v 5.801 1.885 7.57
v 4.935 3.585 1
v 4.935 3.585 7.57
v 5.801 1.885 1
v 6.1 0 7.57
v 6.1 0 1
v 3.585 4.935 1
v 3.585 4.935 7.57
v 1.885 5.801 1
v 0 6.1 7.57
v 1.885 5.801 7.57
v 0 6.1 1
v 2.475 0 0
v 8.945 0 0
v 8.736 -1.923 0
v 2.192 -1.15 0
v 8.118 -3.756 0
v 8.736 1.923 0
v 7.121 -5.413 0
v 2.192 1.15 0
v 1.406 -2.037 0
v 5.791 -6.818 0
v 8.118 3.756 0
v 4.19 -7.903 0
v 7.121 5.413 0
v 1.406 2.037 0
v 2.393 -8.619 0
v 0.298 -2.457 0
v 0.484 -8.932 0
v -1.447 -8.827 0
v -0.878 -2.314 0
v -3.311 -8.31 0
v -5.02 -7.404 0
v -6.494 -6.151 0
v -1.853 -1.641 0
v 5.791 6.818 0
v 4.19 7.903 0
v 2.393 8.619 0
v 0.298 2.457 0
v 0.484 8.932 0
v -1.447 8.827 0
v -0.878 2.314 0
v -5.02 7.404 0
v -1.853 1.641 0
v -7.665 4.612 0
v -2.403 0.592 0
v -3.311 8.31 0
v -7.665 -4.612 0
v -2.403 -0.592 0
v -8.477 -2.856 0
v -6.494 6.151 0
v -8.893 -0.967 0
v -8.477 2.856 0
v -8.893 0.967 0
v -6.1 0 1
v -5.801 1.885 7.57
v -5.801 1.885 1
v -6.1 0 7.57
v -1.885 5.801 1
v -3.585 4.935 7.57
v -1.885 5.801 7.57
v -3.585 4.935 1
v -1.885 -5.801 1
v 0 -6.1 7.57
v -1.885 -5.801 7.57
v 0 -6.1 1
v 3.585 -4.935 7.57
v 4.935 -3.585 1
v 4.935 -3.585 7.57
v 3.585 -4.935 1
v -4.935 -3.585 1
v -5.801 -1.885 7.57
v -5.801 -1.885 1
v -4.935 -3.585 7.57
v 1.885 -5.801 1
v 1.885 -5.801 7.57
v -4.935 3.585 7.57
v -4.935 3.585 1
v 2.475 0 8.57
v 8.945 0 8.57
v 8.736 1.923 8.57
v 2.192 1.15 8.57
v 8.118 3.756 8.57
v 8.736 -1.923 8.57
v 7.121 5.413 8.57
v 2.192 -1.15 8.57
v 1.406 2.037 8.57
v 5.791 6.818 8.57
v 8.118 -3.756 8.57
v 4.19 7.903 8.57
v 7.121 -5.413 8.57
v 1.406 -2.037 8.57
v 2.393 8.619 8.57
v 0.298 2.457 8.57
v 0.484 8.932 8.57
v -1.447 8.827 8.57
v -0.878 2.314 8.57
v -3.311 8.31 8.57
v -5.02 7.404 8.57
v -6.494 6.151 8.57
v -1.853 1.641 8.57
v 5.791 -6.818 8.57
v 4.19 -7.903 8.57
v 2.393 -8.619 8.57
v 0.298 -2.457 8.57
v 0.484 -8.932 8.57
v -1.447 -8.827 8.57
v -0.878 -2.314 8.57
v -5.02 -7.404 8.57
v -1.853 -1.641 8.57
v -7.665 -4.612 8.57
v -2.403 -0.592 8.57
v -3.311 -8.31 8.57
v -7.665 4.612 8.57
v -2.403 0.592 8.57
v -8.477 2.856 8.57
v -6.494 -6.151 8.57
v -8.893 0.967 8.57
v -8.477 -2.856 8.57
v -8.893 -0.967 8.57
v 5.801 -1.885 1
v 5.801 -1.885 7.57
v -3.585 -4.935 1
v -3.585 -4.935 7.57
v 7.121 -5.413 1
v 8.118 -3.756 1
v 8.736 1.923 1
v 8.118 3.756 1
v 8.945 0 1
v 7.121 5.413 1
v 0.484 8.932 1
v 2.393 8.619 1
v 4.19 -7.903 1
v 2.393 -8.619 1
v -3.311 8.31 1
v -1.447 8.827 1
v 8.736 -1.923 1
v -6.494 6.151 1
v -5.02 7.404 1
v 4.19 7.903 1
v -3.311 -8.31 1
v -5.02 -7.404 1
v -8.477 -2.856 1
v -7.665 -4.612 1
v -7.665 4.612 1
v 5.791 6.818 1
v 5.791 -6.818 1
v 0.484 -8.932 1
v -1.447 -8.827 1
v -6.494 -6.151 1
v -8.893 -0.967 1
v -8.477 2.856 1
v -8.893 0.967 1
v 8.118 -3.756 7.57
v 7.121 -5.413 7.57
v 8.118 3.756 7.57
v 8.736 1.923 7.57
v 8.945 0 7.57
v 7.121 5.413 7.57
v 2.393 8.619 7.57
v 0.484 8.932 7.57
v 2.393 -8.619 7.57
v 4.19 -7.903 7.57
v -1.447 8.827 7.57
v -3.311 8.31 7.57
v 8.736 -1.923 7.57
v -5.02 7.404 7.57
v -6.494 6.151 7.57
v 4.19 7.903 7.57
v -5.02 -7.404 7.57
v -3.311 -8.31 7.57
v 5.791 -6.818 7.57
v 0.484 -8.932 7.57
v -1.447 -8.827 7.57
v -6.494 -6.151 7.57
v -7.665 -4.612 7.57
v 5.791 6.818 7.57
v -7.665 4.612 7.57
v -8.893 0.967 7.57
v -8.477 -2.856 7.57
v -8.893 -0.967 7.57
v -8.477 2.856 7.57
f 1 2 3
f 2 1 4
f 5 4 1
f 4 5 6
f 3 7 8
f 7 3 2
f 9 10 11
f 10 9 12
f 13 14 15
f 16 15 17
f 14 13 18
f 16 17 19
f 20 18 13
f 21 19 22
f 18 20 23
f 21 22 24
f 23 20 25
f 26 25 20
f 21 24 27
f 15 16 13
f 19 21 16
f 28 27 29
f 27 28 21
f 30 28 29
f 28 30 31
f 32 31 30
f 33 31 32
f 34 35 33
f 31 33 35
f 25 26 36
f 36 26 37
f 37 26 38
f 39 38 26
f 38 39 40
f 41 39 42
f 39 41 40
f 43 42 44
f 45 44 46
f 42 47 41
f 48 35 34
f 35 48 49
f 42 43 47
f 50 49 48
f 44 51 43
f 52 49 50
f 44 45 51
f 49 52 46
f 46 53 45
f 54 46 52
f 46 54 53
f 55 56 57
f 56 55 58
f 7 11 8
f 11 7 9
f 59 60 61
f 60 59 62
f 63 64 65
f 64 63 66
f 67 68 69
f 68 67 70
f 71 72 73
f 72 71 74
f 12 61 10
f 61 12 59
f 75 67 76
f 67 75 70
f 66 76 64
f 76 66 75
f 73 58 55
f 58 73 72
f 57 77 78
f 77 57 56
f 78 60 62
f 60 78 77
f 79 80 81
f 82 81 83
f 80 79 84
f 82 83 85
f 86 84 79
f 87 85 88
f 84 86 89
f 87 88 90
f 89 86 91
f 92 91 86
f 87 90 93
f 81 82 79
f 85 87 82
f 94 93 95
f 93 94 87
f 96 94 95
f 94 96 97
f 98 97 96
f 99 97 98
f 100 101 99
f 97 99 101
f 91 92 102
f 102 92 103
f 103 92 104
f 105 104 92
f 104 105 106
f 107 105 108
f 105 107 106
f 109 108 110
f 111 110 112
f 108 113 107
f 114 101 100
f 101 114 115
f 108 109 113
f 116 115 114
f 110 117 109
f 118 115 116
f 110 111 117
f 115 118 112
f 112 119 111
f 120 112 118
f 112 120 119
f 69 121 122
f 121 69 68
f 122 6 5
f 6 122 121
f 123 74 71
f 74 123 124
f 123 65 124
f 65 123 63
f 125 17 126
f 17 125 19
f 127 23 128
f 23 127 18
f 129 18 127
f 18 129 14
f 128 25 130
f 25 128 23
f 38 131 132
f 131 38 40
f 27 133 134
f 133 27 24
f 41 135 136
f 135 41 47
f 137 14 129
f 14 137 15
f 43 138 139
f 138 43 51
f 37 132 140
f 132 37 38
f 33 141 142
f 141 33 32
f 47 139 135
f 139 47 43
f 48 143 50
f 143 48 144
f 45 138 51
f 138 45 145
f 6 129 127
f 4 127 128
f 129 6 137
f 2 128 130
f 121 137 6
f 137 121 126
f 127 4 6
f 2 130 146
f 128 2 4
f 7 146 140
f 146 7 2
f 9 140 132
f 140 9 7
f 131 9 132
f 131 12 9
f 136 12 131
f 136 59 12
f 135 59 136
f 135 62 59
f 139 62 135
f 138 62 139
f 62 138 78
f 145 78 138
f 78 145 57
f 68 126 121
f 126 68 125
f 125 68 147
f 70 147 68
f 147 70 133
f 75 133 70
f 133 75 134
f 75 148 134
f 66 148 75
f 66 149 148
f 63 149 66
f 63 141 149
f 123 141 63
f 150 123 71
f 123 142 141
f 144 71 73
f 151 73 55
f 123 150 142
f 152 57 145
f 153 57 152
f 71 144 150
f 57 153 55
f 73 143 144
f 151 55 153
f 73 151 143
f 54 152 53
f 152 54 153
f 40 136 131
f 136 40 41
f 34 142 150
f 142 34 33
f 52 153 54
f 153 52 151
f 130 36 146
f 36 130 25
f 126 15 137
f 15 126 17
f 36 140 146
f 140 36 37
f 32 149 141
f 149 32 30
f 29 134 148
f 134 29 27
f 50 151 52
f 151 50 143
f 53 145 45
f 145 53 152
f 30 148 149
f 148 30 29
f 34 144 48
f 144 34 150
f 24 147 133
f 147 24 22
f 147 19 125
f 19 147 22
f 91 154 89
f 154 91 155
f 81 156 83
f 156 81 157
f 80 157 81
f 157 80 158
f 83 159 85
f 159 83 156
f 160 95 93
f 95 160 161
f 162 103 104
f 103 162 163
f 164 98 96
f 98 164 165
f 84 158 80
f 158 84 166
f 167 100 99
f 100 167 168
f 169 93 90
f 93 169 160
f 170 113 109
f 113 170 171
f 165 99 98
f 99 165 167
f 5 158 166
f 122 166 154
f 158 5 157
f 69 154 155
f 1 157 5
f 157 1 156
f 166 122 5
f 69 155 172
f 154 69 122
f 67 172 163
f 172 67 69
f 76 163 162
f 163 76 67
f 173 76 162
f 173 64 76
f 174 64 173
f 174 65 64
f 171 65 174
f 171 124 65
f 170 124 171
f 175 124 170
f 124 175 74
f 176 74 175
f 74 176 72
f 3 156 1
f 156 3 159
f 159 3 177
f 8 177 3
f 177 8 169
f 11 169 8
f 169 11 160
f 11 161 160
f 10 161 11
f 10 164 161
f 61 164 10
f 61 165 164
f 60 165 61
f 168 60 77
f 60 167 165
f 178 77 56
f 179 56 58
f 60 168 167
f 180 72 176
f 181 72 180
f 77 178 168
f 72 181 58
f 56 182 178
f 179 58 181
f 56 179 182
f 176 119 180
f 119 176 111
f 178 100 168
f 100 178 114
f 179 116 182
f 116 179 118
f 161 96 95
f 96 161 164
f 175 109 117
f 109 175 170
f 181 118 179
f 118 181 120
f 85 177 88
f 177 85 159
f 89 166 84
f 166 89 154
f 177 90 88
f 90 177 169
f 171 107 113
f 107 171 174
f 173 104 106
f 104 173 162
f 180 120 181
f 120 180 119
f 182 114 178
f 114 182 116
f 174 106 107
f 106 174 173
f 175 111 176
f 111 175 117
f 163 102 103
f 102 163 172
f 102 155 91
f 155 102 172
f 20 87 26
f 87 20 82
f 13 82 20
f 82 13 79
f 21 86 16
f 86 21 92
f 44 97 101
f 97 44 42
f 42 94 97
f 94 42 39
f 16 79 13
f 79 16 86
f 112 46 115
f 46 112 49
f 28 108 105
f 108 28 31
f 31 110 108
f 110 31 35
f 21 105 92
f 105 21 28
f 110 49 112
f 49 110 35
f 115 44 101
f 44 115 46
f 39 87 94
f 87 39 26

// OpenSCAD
// file: BeltUp/Belt.scad
/*
  Render a straight piece of belt from A -> B. Use `flip` to change which side the teeth are on.
  - Specification of the belt to draw
  - Array of [start_pos, end_pos, flip_tooth_side]
*/
module beltup_render_straight_belt(belt_spec, position) {
    a = position[0];
    b = position[1];
    flip = position[2];

    echo(position);

    ab = b - a;
    length = magnitude(ab);
    norm = ab / length;
    xpd = cross([0, 1, 0], extend2d_to_3d(norm, 0));
    dot = dot2d([0, 1], norm);
    zangle = acos(dot) * sign(xpd[2]) + (flip ? 180 : 0);

    ty = beltup_spec_belt_tooth_length(belt_spec);
    tz = beltup_spec_belt_tooth_height(belt_spec);
    sy = beltup_spec_belt_tooth_separation(belt_spec);
    num_teeth = beltup_num_teeth(belt_spec, length);

    x = beltup_spec_belt_width(belt_spec);
    y = length;
    z = beltup_spec_belt_thickness(belt_spec);

    translate(flip ? b : a) rotate([0, -90, zangle]) color(beltup_spec_belt_color(belt_spec))
        intersection() {

            //Intersect with this volume to only show valid teeth
            cube([x, y, z + tz + 1]);

            union() {
                //Base of belt
                cube([x, y, z]);

                //Teeth
                for(offset = [0 : num_teeth])
                    translate([0, offset * (sy + ty), z])
                        cube([x, ty, tz]);
            }
        }
}
// file: BeltUp/Wheel.scad
use <Specs.scad>;

/* Render a wheel according to the given specifications */
module beltup_render_wheel(wheel_instance) {

    mwm_assert(wheel_instance[0] != "wheel_instance", "Wrong type", "beltup_render_wheel", concat("Expected a `wheel_instance`, got a `", wheel_instance[0], "`"))
    {
        wheel_spec = beltup_spec_wheel_instance_spec(wheel_instance);
        belt_spec = beltup_spec_wheel_instance_belt(wheel_instance);

        mwm_assert(belt_spec[0] != "belt", "Wrong type", "beltup_render_wheel", concat("Expected a `belt`, got a `", belt_spec[0], "`"))
        {
            ztop = beltup_spec_wheel_outer_z_top(wheel_spec);
            zbot = beltup_spec_wheel_outer_z_bot(wheel_spec);

            position = beltup_spec_wheel_instance_pos(wheel_instance);

            bw = beltup_spec_belt_width(belt_spec);
            bt = beltup_spec_belt_thickness(belt_spec);

            ty = beltup_spec_belt_tooth_height(belt_spec);

            wir = beltup_spec_wheel_inner_rad(wheel_spec);
            wor = beltup_spec_wheel_outer_rad(wheel_spec);

            arg_out_of_range(wir < (bt + ty), "beltup_cmd_wheel_wheel", "belt_radius", "Must be &gt;= belt_thickness + tooth_height")
            {
                translate(position) difference() {
                    union()
                    {
                        //Center cylinder
                        translate([0, 0, 0]) cylinder(r = wir, h = bw, $fn = 100);

                        //bot belt guide
                        translate([0, 0, -zbot]) cylinder(r = wir + wor, h = zbot, $fn = 23);

                        //top belt guide
                        translate([0, 0, bw]) cylinder(r = wir + wor, h = ztop, $fn = 23);
                    }

                    translate([0, 0, -bw])
                        cylinder(r = beltup_spec_wheel_hole_radius(wheel_spec), h = bw * 3, $fs = 0.1);
                }
            }
        }
    }
}

/* Calculate the tangent point between a point and a wheel */
function beltup_wheel_tangent(point, wheel_instance, side) = let(

    wheel_spec = beltup_spec_wheel_instance_spec(wheel_instance),
    belt_spec = beltup_spec_wheel_instance_belt(wheel_instance),
    wheel_pos = beltup_spec_wheel_instance_pos(wheel_instance),
    teeth_in = beltup_spec_wheel_instance_teethin(wheel_instance),

    //Depending on which way the belt is oriented we may need to add one extra belt thickness to clear the wheel rim
    extra_radius = teeth_in ? beltup_spec_belt_thickness(belt_spec) : 0,

    //Generate both tangents from current point to next belt.
    tangents = circle_tangents_through_point(point, circ(wheel_pos, beltup_spec_wheel_inner_rad(wheel_spec) + extra_radius)),

    //Choose which side to go to
    tangent = side ? tangents[0] : tangents[1],

    //Determine if we need to flip the belt
    is_left = is_point_left_of_ray(tangent, wheel_pos),
    flip = (!is_left && teeth_in) || (is_left && !teeth_in),

    end_pos = point_along_ray(tangent, 1)
) [
    point,
    end_pos,
    flip,
];

/* Calculate the tangents between 2 circles, return one based on the wheel_side parameters */
function beltup_wheel_wheel_tangent(belt_spec, wheel_instance_1, wheel_side_1, wheel_instance_2, wheel_side_2) = let(

    flip = true,

    c1 = beltup_spec_wheel_instance_as_circle(wheel_instance_1),
    c2 = beltup_spec_wheel_instance_as_circle(wheel_instance_2),
    tangents = circle_circle_tangents(c1, c2, preserve_order = true),

    tangent_index = !wheel_side_1 && !wheel_side_2 ? 0
                  : !wheel_side_1 && wheel_side_2  ? 1
                  : wheel_side_1 && !wheel_side_2  ? 2
                  :                                  3,

    tangent = tangents[tangent_index],
    start = point_along_ray(tangent, 0),
    end = point_along_ray(tangent, 1)

    //true,false = 2

) [
    start,
    end,
    flip
];
// file: BeltUp/Specs.scad
/* Specify a new belt, this belt spec can be passed into other functions
   - width              - How wide is the belt
   - thickness          - How thick is the belt
   - tooth_length       - How far along the belt does a single tooth extend
   - tooth_separation   - How far between teeth
   - tooth_height       - How far from the belt does each tooth extend
*/
function beltup_specify_belt(width, thickness, tooth_length, tooth_separation, tooth_height, color) = [
    "belt",
    width,
    thickness,
    tooth_length,
    tooth_separation,
    tooth_height,
    color
];
function beltup_spec_belt_width(belt_spec) = belt_spec[1];
function beltup_spec_belt_thickness(belt_spec) = belt_spec[2];
function beltup_spec_belt_tooth_length(belt_spec) = belt_spec[3];
function beltup_spec_belt_tooth_separation(belt_spec) = belt_spec[4];
function beltup_spec_belt_tooth_height(belt_spec) = belt_spec[5];
function beltup_spec_belt_color(belt_spec) = belt_spec[6];
function beltup_num_teeth(belt_spec, length) = ceil(length / (beltup_spec_belt_tooth_length(belt_spec) + beltup_spec_belt_tooth_separation(belt_spec)));

/* Specify a new wheel, this wheel can be passed into other functions
   - inner_radius           - What is the radius of the part of the wheel the belt wraps around
   - outer_radius           - What is the radius of the guides either side of the belt
   - outer_height_top       - What is the height of the guide above the belt
   - outer_height_bot       - What is the height of the guide below the belt
*/
function beltup_specify_wheel(inner_radius, outer_radius = 2, outer_height_top = 1, outer_height_bot = 1, hole_radius = 0) = [
    "wheel",
    inner_radius,
    outer_radius,
    outer_height_top,
    outer_height_bot,
    hole_radius
];
function beltup_spec_wheel_inner_rad(wheel_spec) = wheel_spec[1];
function beltup_spec_wheel_outer_rad(wheel_spec) = wheel_spec[2];
function beltup_spec_wheel_outer_z_top(wheel_spec) = wheel_spec[3];
function beltup_spec_wheel_outer_z_bot(wheel_spec) = wheel_spec[4];
function beltup_spec_wheel_hole_radius(wheel_spec) = wheel_spec[5];

/* Specify a new instance of a wheel spec
*/
function beltup_create_wheel(belt_spec, wheel_spec, position, teeth_in) = [
  "wheel_instance",
  wheel_spec,
  belt_spec,
  position,
  teeth_in
];
function beltup_spec_wheel_instance_spec(wheel_instance) = wheel_instance[1];
function beltup_spec_wheel_instance_belt(wheel_instance) = wheel_instance[2];
function beltup_spec_wheel_instance_pos(wheel_instance) = wheel_instance[3];
function beltup_spec_wheel_instance_teethin(wheel_instance) = wheel_instance[4];
function beltup_spec_wheel_instance_as_circle(wheel_instance) = circ(
  wheel_instance[3],
  beltup_spec_wheel_inner_rad(wheel_instance[1]) + (wheel_instance[4] ? beltup_spec_belt_thickness(wheel_instance[2]) : 0)
);

function beltup_type(object) = object[0];
// file: geometry-2D.scad
function vector_2d(x, y) = [ x, y ];
function x(v) = v[0];
function y(v) = v[1];
function extend2d_to_3d(xy, z) = [ xy[0], xy[1], z];

function perpendicular_left(v) = [ -y(v), x(v) ];
function perpendicular_right(v) = [ y(v), -x(v) ];

function magnitude(v) = sqrt(pow(x(v), 2) + pow(y(v), 2));
function normalize(v) = [ x(v) / magnitude(v), y(v) / magnitude(v) ];

function ray_2d(point, direction) = [ point, direction ];
function invert_ray_along(ray, along) = [ ray[0] + ray[1] * along, -ray[1] ];
function point_along_ray(ray, distance) = ray[0] + ray[1] * distance;
function is_point_left_of_ray(ray, point) = distance_from_ray_to_point(ray, point) > 0;
function distance_from_ray_to_point(ray, point) = cross_2d(ray[1], (point - ray[0])) / magnitude(ray[1]);

function line_segment_2d(start, end) = [ start, end ];

function cross_2d(a, b) = x(a) * y(b) - y(a) * x(b);

function dot2d(a, b) = a[0] * b[0] + a[1] * b[1];
function dot3d(a, b) = a[0] * b[0] + a[1] * b[1] + a[2] * b[2];

function circ(center, radius) = [ center, radius ];

// module demo_geom()
// {
//     c1 = circ(vector_2d(0, 0), 20);
//     c2 = circ(vector_2d(-50, 0), 25);

//     tangents = circle_circle_tangents(c1, c2);

//     translate(c1[0]) circle(r = c1[1]);
//     translate(c2[0]) circle(r = c2[1]);

//     for (t = tangents) {
//         for (i = [0 : 100]) {
//             color("red") translate(point_along_ray(t, i / 100)) circle(r = 1);
//         }
//     }
// }

/*
 * Calculates the intersection points of 2 circles.
 * Returns a list of all intersection points (an empty list, if the circles are disjoint)
 */
function circle_circle_intersection(a, b) =
    //https://stackoverflow.com/a/3349134/108234
    let(
        r0 = a[1],
        r1 = b[1],
        p0 = a[0],
        p1 = b[0],
        d = magnitude(a[0] - b[0])
    )
    //Check for the cases where an intersection is impossible and return an empty list
    (d > r0 + r1 || d < abs(r0 - r1))
    ? []
    //Intersection is possible, calculate where it is
    : let(
        aa = (pow(r0, 2) - pow(r1, 2) + pow(d, 2)) / (2 * d),
        p2 = p0 + aa * (p1 - p0) / d,
        h = sqrt(pow(r0, 2) - pow(aa, 2)),
        p0p1 = normalize(p1 - p0)
    ) [
        p2 + perpendicular_left(p0p1) * h,
        p2 + perpendicular_right(p0p1) * h,
    ];

function circle_circle_tangents(c1, c2) =
    let(
        //rearrange circles so r1 is the larger
        swap = c1[1] < c2[1],
        r1 = swap ? c2 : c1,
        r2 = swap ? c1 : c2,

        dist = magnitude(c2[0] - c1[0])
    )
    
    //Check if the larger circle completely contains the smaller, in which case return an empty list
    r1[1] > dist + r2[1] ? []

    //Ok we can generate some tangents at least
    : let(
        //Construct tangents through center of r2, to r1 (shrunk by r2 radius)
        otans = circle_tangents_through_point(r2[0], circ(r1[0], r1[1] - r2[1])),
        outer = [
            ray_2d(otans[0][0] + perpendicular_right(normalize(otans[0][1])) * r2[1], otans[0][1]),
            ray_2d(otans[1][0] + perpendicular_left(normalize(otans[1][1])) * r2[1], otans[1][1]),
        ],

        outer_swapped = [
            swap ? invert_ray_along(outer[0], 1) : outer[0],
            swap ? invert_ray_along(outer[1], 1) : outer[1],
        ],

        //Construct tangents through center of r2, to r1  (inflated by r2 radius)
        itans = circle_tangents_through_point(r2[0], circ(r1[0], r1[1] + r2[1])),
        inner = [
            ray_2d(itans[0][0] + perpendicular_left(normalize(itans[0][1])) * r2[1], itans[0][1]),
            ray_2d(itans[1][0] + perpendicular_right(normalize(itans[1][1])) * r2[1], itans[1][1])
        ],
        
        inner_swapped = [
            swap ? invert_ray_along(inner[0], 1) : inner[0],
            swap ? invert_ray_along(inner[1], 1) : inner[1],
        ]
    )
    
    //Check if the circles intersect, in which case only return the outer tangents
    dist < (r1[1] + r2[1])
    ? [ outer_swapped[0], outer_swapped[1] ]
    : [ outer_swapped[0], outer_swapped[1], inner_swapped[0], inner_swapped[1] ];

/*
 * Calculate the 2 circle tangents through a point.
 * Returns a list of 2 intersections through the given point, or an empty list if the point is inside the circle
 */
function circle_tangents_through_point(point, circl) =
    //http://intermath.coe.uga.edu/tweb/CPTM1/jwilson/wilson/tancir/tanconstr.htm
    let(
        dist = magnitude(point - circl[0])
    ) dist <= circl[1]
    ? []
    : let(
        c = point,
        a = circl[0],
        radius = circl[1],
        m = a * 0.5 + c * 0.5,
        am_mag = magnitude(m - a),
        circ_m = circ(m, am_mag),
        f_g = circle_circle_intersection(circl, circ_m),
        cg = ray_2d(c, f_g[0] - c),
        cf = ray_2d(c, f_g[1] - c)
    ) [ cg, cf ];
// file: mistakes-were-made.scad
module mwm_assert(err, ex, modName, msg) {
    if (err)
        echo(str("<b><font color='red'>", ex, "</font> in module '", modName, "' - ", msg, "</b>"));
    else
        children();
}

module arg_out_of_range(err, modName, param, msg) {
    mwm_assert(err, "ARG OUT OF RANGE", modName, str(param, " : ", msg))
        children();
}

module invalid_arg(err, modName, param, msg) {
    mwm_assert(err, "INVALID ARG", modName, str(param, " : ", msg))
        children();
}
// file: BeltUp/Core.scad
/*
 * Paramtric library for belts and pulleys
 * Martin Evans - 2018
 */

include <../mistakes-were-made.scad>;
include <../geometry-2D.scad>;

include <Specs.scad>;
include <Wheel.scad>;
include <Belt.scad>;
// main file
//Size based on the anycubic GT2 idler

function idler_outer_diameter() = 17.89;
function idler_inner_diameter() = 12.20;
function idler_hole_diameter() = 4.95;
function idler_height() = 8.57;

use <BeltUp/Core.scad>;
function idler_beltup_spec(belt_spec) = beltup_specify_wheel(
    inner_radius = idler_inner_diameter() / 2,
    outer_radius = (idler_outer_diameter() - idler_inner_diameter()) / 2,
    outer_height_top = (idler_height() - beltup_spec_belt_width(belt_spec)) / 2,
    outer_height_bot = (idler_height() - beltup_spec_belt_width(belt_spec)) / 2,
    hole_radius = idler_hole_diameter() / 2
);

module idler() {

    difference() {
        union() {
            cylinder(d = idler_inner_diameter(), h = idler_height());
            cylinder(d = idler_outer_diameter(), h = 1);

            translate([0, 0, idler_height() - 1])
                cylinder(d = idler_outer_diameter(), h = 1);
        }

        translate([0, 0, -idler_height()])
            cylinder(d = idler_hole_diameter(), h = idler_height() * 3, $fn = 13);
    }
}

idler();
